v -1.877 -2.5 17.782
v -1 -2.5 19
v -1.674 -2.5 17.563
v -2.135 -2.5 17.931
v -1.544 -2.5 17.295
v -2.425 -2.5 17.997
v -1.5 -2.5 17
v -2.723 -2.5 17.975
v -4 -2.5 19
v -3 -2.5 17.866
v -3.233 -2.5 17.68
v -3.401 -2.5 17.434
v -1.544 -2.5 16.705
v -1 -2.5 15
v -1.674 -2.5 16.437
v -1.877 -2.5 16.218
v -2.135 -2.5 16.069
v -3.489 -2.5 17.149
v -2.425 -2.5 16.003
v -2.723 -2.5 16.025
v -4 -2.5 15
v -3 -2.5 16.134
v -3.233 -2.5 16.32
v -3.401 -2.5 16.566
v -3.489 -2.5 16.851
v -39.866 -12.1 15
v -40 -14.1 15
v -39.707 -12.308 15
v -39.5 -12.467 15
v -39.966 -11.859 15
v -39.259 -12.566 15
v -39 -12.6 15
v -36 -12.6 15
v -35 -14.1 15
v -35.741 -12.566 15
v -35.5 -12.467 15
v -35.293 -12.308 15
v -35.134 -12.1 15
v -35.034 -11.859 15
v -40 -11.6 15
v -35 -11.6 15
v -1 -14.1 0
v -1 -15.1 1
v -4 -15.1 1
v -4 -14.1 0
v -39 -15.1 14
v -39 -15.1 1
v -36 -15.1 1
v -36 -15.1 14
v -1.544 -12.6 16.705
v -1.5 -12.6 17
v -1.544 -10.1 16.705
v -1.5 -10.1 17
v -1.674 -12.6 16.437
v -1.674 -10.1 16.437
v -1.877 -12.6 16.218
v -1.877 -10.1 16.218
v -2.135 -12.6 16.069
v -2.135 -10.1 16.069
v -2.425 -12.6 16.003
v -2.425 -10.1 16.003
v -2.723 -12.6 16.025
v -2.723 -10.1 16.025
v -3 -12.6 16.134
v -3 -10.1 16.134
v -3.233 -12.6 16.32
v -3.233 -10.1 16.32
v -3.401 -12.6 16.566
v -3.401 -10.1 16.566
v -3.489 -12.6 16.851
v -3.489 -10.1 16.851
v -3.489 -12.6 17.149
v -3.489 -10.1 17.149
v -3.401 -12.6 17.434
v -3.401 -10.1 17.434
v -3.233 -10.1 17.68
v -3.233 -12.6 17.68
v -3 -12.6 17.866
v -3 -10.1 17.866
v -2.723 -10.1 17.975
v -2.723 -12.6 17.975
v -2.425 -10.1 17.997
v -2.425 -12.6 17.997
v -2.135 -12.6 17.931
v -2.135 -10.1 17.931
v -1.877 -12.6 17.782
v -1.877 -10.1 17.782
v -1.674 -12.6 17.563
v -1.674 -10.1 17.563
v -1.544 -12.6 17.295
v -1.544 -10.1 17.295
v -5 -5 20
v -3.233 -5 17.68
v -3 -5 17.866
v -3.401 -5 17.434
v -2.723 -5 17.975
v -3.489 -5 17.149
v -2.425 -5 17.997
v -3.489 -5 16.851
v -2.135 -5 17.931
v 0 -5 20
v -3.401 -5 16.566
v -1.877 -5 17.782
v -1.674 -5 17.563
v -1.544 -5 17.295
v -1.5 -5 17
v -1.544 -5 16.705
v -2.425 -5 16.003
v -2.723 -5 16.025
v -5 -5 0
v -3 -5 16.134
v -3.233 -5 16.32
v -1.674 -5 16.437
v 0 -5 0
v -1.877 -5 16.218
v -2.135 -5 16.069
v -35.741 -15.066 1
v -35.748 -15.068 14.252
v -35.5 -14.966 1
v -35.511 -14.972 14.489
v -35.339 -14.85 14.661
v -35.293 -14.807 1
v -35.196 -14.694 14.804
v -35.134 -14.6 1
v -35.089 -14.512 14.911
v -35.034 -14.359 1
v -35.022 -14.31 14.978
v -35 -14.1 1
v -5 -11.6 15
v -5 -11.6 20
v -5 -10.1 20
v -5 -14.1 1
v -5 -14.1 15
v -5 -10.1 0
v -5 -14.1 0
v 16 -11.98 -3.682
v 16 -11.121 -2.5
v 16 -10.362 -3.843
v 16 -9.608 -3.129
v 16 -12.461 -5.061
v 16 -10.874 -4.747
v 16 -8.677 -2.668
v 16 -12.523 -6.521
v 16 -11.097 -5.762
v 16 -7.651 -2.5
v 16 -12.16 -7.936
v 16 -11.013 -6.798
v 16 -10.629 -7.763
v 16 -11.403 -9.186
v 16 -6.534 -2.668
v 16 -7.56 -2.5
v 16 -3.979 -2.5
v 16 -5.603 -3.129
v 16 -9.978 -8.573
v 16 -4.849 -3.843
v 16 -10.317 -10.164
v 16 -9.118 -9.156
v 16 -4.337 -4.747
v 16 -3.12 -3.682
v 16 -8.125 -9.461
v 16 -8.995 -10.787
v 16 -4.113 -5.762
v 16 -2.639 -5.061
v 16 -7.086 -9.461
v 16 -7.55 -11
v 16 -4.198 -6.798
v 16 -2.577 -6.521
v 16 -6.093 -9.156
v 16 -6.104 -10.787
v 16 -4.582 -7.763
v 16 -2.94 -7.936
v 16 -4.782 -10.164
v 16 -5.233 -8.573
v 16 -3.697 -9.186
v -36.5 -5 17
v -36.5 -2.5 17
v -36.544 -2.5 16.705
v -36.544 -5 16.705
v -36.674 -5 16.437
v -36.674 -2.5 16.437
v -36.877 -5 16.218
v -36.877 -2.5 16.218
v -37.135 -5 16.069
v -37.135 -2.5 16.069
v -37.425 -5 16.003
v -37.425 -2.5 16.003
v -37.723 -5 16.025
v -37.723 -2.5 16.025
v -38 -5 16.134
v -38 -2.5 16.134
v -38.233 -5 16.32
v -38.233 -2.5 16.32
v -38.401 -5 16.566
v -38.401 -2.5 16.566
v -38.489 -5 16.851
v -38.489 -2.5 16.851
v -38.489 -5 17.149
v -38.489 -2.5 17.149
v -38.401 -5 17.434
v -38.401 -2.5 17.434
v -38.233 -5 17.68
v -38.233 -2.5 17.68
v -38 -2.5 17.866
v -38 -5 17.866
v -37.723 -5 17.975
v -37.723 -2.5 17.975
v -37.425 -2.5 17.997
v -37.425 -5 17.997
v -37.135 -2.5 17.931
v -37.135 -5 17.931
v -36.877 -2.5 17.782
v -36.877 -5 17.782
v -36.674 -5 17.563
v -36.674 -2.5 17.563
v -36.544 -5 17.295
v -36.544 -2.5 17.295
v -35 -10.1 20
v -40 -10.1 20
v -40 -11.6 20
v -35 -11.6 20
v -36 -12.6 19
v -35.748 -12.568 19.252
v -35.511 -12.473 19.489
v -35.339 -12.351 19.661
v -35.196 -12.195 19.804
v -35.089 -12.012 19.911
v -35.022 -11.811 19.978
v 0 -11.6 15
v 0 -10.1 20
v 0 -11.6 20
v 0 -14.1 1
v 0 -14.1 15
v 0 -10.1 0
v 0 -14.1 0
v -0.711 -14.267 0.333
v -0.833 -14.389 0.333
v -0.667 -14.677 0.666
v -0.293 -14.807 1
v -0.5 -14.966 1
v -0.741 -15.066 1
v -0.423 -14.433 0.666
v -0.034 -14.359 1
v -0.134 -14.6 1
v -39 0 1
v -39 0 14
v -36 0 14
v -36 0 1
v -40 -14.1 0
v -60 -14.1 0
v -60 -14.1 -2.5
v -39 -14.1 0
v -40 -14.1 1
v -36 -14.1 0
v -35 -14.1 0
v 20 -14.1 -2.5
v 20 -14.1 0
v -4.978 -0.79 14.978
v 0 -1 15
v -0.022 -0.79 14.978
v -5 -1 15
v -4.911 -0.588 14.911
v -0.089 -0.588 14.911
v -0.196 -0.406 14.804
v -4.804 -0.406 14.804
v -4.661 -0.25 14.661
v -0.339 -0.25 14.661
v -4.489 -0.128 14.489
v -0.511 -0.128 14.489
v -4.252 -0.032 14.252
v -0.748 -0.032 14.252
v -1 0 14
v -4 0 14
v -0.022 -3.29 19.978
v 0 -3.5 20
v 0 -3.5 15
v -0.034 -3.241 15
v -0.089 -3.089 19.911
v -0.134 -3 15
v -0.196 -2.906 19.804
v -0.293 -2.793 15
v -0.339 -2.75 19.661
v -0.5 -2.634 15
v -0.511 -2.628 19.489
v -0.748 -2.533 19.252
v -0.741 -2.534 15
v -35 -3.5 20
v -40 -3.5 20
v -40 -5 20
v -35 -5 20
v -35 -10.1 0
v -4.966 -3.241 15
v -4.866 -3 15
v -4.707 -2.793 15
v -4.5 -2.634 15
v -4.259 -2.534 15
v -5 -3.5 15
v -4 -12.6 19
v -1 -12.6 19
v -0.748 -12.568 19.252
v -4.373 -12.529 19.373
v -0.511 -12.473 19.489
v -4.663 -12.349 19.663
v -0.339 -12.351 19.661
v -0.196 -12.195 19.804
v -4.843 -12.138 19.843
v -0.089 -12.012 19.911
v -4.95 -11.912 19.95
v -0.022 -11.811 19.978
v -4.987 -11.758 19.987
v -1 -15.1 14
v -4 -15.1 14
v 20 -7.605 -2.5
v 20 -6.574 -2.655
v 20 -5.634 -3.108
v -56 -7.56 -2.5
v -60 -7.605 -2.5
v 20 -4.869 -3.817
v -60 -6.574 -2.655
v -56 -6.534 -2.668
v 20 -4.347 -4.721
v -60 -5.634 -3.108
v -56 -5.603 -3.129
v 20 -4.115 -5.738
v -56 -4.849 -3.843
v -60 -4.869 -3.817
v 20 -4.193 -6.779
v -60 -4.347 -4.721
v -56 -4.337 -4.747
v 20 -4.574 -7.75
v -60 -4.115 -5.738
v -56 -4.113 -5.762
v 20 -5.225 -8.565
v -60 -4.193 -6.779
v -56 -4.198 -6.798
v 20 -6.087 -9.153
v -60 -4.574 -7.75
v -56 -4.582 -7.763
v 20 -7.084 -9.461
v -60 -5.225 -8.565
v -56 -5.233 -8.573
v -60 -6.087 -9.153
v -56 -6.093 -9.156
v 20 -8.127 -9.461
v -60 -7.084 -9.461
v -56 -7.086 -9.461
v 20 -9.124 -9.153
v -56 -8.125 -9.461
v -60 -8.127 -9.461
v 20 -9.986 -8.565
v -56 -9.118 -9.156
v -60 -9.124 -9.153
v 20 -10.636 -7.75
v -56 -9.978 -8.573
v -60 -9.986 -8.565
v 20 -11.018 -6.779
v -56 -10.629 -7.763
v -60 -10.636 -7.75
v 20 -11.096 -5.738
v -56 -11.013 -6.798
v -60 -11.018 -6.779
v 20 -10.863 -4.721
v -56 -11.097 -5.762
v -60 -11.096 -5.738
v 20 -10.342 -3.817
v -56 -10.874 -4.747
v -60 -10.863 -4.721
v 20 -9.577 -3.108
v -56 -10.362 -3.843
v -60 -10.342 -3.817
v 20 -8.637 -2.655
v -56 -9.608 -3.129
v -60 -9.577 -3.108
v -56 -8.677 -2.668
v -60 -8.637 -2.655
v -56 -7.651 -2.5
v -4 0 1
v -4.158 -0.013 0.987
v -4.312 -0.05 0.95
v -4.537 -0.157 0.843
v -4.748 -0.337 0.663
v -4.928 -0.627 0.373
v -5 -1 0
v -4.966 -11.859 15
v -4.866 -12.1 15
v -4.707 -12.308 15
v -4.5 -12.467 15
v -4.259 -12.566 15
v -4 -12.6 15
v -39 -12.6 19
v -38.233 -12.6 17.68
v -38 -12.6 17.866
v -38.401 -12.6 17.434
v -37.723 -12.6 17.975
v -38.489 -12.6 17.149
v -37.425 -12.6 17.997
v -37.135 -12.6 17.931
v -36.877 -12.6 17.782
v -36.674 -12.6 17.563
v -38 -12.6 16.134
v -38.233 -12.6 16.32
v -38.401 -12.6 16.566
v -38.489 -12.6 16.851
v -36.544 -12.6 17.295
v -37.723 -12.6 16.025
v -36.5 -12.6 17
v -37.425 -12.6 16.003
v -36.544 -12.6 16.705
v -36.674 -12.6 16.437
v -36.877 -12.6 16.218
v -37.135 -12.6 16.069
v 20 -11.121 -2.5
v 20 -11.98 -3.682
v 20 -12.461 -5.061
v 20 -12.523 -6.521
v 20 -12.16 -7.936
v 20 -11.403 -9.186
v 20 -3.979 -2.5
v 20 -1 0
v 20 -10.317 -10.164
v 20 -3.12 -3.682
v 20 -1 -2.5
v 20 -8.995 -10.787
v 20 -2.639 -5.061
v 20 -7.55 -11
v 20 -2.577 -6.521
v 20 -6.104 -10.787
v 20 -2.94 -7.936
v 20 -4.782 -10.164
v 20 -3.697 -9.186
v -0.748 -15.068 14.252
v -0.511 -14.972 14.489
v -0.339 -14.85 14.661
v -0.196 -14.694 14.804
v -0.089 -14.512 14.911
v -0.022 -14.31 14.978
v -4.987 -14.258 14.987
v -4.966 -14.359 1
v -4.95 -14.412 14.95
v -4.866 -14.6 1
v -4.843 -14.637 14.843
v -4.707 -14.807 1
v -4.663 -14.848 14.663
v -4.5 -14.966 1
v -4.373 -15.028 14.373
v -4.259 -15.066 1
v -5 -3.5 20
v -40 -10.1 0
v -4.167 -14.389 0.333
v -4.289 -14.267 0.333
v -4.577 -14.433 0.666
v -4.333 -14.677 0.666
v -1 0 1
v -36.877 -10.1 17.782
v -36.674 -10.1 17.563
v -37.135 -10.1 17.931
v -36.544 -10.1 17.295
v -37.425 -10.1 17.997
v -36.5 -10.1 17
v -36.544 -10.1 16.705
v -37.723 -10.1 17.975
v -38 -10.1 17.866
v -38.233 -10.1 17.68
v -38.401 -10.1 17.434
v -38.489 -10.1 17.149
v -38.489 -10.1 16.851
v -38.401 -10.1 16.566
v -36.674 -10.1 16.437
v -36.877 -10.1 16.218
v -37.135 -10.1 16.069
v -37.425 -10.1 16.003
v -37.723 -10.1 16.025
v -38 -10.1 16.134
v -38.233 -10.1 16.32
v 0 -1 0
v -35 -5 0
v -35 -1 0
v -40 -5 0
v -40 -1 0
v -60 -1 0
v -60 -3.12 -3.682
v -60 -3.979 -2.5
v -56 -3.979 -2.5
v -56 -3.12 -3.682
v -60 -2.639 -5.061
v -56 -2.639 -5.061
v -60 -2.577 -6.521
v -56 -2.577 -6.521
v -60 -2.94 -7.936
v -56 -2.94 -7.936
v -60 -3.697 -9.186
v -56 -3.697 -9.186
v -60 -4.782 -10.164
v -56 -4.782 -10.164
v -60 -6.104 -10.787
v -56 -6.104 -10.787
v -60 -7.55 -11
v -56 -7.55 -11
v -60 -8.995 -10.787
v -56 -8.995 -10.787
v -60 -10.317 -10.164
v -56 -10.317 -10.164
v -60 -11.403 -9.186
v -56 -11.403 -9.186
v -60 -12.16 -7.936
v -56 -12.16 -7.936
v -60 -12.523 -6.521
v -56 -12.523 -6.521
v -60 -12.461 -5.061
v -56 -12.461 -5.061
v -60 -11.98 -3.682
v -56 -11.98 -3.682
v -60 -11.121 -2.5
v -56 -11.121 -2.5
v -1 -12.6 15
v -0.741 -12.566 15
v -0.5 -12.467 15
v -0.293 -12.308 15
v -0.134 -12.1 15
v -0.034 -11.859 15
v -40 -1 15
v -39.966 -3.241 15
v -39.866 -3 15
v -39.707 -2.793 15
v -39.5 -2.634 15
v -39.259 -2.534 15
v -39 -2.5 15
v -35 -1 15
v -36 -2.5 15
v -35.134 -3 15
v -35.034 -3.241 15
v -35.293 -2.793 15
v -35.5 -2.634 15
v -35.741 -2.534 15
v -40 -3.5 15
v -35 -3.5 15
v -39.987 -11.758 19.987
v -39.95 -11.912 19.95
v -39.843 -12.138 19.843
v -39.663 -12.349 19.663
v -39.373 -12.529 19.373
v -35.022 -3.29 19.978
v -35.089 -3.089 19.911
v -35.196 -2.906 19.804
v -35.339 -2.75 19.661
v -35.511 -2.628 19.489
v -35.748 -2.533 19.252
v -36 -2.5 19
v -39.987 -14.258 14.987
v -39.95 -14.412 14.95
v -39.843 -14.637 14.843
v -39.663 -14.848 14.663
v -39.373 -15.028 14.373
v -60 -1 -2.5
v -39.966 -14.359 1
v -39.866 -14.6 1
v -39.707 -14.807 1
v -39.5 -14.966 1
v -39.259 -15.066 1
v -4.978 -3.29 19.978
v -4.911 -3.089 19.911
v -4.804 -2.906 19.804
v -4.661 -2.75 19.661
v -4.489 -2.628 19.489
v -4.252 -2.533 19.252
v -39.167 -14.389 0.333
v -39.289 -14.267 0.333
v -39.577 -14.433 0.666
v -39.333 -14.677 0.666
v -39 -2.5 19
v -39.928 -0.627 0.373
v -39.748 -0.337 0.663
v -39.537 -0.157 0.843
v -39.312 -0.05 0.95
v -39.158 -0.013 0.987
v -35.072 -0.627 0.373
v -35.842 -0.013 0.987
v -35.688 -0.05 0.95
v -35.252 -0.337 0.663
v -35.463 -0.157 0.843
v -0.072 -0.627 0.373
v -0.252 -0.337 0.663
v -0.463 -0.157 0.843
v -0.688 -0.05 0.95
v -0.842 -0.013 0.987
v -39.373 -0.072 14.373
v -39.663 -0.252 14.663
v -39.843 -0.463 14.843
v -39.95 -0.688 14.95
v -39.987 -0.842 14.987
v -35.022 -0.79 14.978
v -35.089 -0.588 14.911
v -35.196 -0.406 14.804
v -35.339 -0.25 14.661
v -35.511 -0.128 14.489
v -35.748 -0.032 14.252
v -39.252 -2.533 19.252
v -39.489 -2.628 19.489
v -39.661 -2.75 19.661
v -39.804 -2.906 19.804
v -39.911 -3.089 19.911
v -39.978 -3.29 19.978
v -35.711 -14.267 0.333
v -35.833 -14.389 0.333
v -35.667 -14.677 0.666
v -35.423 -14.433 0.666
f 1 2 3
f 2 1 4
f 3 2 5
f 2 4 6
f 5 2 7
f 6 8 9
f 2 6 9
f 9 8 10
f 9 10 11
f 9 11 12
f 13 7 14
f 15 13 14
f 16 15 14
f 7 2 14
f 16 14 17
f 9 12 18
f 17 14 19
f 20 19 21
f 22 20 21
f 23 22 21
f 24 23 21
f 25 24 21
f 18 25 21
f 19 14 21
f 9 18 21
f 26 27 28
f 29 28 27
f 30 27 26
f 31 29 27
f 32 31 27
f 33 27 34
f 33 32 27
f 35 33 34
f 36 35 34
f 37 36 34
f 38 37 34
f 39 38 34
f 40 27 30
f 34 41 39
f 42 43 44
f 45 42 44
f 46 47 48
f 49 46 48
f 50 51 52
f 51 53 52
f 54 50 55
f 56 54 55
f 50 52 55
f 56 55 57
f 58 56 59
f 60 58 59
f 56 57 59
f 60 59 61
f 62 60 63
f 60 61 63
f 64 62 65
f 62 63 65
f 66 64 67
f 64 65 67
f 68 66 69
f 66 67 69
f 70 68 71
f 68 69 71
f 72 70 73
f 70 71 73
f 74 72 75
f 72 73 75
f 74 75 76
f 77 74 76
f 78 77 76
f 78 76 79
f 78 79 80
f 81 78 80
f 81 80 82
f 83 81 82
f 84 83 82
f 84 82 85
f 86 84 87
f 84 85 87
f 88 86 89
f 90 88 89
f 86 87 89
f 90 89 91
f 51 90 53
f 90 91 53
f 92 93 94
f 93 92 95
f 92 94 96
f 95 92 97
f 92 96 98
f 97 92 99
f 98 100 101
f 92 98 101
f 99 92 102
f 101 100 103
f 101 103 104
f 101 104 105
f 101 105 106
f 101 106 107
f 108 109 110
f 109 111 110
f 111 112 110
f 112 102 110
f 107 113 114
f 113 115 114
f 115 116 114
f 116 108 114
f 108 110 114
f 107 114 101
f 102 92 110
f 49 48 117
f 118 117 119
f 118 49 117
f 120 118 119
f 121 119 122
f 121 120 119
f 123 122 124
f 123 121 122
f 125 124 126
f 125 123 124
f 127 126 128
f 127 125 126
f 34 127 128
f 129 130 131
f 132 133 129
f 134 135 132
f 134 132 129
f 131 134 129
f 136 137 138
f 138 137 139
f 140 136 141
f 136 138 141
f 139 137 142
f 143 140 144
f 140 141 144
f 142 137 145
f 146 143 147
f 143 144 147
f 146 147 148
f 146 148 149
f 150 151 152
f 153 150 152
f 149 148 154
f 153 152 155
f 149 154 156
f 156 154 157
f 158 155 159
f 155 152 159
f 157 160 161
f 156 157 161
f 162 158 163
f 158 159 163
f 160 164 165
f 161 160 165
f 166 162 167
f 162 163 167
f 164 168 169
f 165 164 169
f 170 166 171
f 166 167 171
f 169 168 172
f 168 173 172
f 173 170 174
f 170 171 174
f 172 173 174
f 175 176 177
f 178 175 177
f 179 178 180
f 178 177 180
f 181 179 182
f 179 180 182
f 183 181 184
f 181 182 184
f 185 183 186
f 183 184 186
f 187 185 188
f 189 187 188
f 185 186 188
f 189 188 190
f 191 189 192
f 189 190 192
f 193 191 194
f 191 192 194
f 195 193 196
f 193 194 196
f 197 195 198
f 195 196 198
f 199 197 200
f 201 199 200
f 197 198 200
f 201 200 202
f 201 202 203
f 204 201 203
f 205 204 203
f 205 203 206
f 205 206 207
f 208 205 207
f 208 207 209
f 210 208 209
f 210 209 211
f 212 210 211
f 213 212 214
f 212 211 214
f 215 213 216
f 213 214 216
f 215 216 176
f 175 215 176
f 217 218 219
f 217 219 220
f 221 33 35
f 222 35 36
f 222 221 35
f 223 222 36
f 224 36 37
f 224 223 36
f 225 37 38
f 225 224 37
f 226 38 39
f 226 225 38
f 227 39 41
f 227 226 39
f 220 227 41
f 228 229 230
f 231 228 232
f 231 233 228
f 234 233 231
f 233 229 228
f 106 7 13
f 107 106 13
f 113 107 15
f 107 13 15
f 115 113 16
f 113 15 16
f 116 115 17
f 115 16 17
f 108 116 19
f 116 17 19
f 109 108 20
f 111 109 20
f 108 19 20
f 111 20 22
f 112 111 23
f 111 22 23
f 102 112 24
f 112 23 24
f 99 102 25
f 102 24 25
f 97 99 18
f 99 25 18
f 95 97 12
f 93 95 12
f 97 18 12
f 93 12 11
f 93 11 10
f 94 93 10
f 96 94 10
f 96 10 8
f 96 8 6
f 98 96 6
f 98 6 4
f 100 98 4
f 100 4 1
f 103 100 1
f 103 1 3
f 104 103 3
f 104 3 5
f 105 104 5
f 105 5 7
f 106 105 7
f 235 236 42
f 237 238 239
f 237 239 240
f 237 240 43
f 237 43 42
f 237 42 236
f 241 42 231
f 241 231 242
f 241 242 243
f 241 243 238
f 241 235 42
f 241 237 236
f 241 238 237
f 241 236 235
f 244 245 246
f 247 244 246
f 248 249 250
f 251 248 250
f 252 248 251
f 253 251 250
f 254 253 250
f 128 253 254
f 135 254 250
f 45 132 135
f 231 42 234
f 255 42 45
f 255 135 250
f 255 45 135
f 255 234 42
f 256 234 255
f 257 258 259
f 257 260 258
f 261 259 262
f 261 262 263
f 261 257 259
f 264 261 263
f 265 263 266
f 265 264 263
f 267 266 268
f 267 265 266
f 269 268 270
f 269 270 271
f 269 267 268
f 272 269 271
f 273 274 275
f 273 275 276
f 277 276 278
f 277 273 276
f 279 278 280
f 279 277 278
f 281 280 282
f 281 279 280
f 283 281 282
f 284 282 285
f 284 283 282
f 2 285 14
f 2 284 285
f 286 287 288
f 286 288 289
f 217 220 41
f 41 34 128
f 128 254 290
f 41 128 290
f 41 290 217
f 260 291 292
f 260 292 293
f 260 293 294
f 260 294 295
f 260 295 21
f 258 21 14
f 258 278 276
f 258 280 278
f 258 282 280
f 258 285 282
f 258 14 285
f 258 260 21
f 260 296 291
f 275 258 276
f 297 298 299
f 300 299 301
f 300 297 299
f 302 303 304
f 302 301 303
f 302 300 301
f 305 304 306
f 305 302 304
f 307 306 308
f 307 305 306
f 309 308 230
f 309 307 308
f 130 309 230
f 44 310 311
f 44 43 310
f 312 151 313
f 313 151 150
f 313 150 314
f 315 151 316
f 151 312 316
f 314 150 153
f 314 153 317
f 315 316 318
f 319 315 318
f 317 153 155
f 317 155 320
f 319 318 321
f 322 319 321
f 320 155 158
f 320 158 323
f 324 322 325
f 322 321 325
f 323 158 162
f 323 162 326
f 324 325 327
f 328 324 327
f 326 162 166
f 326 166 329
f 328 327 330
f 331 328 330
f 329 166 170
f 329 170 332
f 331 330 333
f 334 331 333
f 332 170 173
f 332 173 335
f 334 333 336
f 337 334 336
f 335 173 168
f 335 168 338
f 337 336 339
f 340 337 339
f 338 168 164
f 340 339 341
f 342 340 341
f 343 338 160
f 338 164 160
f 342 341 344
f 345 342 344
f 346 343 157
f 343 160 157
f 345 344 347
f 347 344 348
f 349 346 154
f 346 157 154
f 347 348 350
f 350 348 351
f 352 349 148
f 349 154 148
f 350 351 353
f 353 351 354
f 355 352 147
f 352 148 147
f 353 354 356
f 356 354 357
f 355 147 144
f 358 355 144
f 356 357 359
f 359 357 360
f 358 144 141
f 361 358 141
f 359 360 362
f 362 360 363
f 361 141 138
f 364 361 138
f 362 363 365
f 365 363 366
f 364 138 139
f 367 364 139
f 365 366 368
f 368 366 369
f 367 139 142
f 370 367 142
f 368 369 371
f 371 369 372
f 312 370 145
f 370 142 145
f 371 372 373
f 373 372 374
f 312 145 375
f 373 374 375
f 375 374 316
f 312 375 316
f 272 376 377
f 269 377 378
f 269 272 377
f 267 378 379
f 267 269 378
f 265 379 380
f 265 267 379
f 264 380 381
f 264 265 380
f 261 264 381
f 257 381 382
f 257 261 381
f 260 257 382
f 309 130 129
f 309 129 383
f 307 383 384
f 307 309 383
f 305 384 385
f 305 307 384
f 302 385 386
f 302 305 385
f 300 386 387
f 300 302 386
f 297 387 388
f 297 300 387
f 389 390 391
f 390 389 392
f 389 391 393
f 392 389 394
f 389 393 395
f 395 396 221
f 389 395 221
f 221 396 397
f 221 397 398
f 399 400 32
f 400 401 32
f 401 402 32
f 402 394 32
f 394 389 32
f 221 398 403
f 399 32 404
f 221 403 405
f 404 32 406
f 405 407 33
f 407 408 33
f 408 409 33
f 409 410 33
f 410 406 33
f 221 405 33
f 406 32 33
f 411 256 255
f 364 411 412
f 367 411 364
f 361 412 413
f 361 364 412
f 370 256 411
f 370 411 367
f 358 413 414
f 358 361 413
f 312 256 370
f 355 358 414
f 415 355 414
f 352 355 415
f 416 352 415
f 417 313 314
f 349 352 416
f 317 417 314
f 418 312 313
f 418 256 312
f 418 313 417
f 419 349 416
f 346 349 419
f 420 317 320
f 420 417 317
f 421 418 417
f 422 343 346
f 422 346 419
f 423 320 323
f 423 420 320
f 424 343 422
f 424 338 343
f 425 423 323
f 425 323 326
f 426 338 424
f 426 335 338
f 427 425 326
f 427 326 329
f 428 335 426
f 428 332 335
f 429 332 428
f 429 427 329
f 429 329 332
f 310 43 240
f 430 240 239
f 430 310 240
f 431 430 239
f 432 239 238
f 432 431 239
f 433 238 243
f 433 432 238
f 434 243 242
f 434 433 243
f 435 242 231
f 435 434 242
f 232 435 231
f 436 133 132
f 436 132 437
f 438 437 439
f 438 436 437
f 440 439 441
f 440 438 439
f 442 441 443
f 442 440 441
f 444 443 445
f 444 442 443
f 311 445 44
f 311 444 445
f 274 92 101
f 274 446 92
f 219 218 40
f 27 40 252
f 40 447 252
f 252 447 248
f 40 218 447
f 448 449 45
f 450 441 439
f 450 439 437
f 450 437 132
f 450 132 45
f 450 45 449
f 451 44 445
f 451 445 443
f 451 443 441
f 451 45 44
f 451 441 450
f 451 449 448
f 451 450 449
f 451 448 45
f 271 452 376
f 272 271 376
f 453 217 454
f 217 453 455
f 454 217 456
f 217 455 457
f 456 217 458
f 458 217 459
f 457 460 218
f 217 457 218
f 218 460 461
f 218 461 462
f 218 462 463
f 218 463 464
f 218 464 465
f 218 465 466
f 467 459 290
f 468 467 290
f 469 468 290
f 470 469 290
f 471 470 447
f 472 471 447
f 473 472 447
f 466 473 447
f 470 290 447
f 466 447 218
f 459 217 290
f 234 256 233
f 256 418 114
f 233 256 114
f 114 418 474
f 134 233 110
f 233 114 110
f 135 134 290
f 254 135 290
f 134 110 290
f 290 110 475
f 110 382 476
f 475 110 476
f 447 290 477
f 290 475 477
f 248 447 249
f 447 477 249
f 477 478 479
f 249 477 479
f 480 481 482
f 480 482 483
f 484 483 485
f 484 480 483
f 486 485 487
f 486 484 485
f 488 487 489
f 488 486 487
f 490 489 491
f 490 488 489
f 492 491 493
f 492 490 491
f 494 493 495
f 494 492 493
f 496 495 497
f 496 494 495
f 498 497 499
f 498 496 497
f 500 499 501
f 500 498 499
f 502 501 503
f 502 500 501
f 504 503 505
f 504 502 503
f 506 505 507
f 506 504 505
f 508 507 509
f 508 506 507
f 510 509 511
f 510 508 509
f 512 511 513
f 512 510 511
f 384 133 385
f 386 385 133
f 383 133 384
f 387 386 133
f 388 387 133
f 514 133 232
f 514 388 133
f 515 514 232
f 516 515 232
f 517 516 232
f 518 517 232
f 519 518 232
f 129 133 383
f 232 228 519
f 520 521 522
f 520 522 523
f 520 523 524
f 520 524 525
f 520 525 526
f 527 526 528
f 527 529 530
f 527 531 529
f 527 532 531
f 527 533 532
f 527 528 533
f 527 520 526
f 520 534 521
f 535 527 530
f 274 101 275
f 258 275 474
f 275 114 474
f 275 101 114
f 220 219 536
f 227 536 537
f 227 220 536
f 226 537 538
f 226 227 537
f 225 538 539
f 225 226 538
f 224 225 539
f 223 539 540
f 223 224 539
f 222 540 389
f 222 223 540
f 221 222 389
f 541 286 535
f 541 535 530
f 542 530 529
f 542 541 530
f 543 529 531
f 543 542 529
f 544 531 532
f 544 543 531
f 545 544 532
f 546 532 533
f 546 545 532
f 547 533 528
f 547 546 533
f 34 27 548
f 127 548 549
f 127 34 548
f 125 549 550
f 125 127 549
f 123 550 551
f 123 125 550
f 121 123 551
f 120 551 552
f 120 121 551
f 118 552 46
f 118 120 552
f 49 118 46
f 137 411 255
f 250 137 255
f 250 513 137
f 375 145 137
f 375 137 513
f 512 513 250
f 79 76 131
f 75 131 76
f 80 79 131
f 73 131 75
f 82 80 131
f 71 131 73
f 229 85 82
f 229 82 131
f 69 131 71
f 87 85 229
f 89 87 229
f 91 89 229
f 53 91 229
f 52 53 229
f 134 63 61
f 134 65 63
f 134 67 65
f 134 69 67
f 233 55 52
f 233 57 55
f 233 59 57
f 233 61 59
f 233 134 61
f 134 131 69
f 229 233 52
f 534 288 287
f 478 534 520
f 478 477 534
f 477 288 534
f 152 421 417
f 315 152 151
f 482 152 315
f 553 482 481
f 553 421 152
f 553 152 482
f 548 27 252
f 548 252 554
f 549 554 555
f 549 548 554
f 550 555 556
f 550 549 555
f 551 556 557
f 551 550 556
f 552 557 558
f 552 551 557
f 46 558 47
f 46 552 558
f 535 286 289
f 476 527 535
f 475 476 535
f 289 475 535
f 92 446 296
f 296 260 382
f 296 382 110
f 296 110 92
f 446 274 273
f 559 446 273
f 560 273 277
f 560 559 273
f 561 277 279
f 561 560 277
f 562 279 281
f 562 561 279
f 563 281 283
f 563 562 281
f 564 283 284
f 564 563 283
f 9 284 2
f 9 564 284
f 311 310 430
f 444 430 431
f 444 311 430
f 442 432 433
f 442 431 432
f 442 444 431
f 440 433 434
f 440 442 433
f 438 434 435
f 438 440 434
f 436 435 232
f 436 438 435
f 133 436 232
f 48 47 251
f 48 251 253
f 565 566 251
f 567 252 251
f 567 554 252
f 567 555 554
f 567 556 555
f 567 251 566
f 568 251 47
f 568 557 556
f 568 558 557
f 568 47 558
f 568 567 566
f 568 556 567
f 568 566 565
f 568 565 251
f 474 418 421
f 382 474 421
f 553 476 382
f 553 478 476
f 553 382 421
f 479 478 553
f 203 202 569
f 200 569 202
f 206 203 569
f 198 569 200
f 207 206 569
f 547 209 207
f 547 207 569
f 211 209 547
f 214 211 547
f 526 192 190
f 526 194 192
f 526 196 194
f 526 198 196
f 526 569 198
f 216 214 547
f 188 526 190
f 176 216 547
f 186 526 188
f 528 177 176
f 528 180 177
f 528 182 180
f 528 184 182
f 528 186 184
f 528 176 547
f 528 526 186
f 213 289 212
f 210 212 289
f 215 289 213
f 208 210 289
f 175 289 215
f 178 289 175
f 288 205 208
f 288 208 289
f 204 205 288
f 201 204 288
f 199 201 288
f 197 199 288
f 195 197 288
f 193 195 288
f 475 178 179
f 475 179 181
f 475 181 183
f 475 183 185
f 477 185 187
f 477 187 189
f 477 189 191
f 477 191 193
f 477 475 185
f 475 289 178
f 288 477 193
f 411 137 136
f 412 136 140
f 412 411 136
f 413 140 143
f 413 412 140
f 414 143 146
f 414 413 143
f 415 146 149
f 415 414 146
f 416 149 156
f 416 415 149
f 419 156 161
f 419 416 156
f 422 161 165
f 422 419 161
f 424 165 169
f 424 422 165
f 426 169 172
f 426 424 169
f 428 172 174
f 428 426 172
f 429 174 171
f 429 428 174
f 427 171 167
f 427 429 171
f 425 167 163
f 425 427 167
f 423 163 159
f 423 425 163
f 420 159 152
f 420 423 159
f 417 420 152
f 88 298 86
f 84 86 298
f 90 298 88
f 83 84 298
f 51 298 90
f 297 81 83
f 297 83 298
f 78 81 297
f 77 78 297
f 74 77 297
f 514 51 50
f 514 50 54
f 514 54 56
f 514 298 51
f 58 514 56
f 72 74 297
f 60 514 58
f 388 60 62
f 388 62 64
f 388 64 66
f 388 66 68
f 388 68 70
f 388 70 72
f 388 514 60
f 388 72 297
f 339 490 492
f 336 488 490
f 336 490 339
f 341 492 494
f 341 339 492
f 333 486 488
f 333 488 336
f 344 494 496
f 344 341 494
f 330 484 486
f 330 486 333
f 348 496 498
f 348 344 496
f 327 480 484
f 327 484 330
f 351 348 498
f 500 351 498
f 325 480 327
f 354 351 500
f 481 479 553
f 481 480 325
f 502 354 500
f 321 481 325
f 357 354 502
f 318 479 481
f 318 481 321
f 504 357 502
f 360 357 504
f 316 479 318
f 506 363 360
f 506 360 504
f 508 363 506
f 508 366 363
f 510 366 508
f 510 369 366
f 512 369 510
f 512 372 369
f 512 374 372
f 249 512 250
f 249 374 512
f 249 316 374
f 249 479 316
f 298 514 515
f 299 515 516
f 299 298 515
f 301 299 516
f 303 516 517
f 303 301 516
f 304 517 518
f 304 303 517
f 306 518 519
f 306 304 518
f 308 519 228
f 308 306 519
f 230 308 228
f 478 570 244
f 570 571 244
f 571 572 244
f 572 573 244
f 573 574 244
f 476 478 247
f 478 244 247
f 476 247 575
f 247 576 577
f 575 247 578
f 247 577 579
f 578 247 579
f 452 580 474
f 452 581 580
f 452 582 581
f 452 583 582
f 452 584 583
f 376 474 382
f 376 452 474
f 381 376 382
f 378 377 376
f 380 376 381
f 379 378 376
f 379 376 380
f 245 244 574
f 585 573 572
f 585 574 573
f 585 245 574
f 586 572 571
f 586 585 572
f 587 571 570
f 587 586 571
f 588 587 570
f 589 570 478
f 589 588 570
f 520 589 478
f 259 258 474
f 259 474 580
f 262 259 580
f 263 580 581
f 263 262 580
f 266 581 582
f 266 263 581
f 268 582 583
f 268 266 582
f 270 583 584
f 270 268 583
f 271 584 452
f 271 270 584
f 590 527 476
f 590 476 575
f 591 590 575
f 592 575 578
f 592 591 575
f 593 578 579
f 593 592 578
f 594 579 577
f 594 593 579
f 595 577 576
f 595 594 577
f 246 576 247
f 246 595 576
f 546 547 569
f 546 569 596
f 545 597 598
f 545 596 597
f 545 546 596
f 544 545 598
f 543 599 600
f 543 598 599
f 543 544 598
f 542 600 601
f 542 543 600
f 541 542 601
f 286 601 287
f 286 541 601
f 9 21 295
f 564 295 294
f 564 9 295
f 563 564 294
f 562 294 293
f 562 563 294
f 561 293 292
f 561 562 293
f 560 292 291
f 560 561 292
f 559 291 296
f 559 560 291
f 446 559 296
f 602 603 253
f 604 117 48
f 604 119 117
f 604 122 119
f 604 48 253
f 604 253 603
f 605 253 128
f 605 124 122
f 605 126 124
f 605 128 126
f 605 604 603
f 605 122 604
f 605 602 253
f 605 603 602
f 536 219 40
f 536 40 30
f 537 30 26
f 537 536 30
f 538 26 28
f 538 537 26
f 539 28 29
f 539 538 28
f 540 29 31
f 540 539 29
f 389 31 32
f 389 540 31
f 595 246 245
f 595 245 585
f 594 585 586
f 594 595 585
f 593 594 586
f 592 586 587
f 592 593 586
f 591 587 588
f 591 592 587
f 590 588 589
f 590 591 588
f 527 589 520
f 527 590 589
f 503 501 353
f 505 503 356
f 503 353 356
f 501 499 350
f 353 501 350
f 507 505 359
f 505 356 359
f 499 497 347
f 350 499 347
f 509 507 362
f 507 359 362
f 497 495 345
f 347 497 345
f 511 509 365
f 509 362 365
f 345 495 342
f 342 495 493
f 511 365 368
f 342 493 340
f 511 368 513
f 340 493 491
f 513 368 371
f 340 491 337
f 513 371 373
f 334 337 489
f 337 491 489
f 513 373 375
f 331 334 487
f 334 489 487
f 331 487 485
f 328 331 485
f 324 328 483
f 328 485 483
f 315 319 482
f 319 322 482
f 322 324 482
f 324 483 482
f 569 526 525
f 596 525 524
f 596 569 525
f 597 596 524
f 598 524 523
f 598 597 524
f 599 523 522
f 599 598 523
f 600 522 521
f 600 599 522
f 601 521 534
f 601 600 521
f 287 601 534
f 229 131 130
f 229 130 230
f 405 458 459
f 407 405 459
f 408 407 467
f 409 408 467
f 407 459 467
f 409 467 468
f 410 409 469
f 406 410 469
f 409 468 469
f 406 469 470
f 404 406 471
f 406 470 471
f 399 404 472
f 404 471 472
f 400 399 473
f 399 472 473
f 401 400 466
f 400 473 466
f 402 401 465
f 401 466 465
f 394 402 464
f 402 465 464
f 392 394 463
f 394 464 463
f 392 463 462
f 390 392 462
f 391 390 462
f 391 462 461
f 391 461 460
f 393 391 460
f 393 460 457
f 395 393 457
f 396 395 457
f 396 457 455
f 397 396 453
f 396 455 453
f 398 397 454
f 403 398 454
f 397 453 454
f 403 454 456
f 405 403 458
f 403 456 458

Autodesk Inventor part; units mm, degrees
ref_plane "YZ Plane" through (0, 0, 0) normal (1, 0, 0) x (0, 1, 0)
ref_plane "XZ Plane" through (0, 0, 0) normal (0, 1, 0) x (-1, 0, 0)
ref_plane "XY Plane" through (0, 0, 0) normal (0, 0, 1) x (1, 0, 0)
sketch "Sketch1" plane through (0, 0, 0) normal (0, 0, 1) x (1, 0, 0)
  line L0 (0, 0) -> (-5, 0)
  line L1 (-5, 0) -> (-5, -5)
  line L2 (-5, -5) -> (0, -5)
  line L3 (0, -5) -> (0, 0)
  line L4 (-40, 0) -> (-35, 0)
  line L5 (-35, 0) -> (-35, -5)
  line L6 (-35, -5) -> (-40, -5)
  line L7 (-40, -5) -> (-40, 0)
  line L8 (0, -15.1) -> (-5, -15.1)
  line L9 (-5, -15.1) -> (-5, -10.1)
  line L10 (-5, -10.1) -> (0, -10.1)
  line L11 (0, -10.1) -> (0, -15.1)
  line L12 (-40, -15.1) -> (-35, -15.1)
  line L13 (-35, -15.1) -> (-35, -10.1)
  line L14 (-35, -10.1) -> (-40, -10.1)
  line L15 (-40, -10.1) -> (-40, -15.1)
  line L16 (0, 0) -> (-5, 0)
  line L17 (-35, 0) -> (-40, 0)
  line L18 (0, -15.1) -> (0, -10.1)
  line L19 (0, -5) -> (0, 0)
  line L20 (-40, -15.1) -> (-35, -15.1)
  line L21 (-5, -15.1) -> (0, -15.1)
  line L22 (-40, 0) -> (-40, -5)
  line L23 (-40, -10.1) -> (-40, -15.1)
  dimension "d0" = 40
  dimension "d1" = 15.1
  dimension "d2" = 5
  dimension "d3" = 5
  dimension "d4" = 5
  dimension "d5" = 5
  dimension "d6" = 5
  dimension "d7" = 5
  dimension "d8" = 5
  dimension "d9" = 5
extrude "Mounting arms" add sketch "Sketch1" along normal blind 15
sketch "Sketch2" plane through (0, 0, 0) normal (0, 0, -1) x (-1, 0, 0)
  line L0 (-19.9999, -1.0001) -> (59.9998, -1.0001)
  line L1 (59.9998, -1.0001) -> (59.9998, -14.0997)
  line L2 (59.9998, -14.0997) -> (-19.9999, -14.0997)
  line L3 (-19.9999, -14.0997) -> (-19.9999, -1.0001)
  point P0 (0, 0)
extrude "Plate" add sketch "Sketch2" along normal blind 2.5
sketch "Sketch3" plane through (19.9999, -14.0997, 0) normal (1, 0, 0) x (0, 0, -1)
  circle A0 centre (6, 6.5498) radius 5
  point P0 (0, 14.0997)
  dimension "d14" = 10
sketch "Sketch5" plane through (-59.9998, -14.0997, 0) normal (-1, 0, 0) x (0, 0, 1)
  circle A0 centre (-6, 6.5498) radius 5
  point P0 (0, 14.0997)
  dimension "d15" = 10
extrude "retainer1" add sketch "Sketch5" against normal blind 4
extrude "retainer2" add sketch "Sketch3" against normal blind 4
sketch "Sketch6" plane through (-59.9998, -14.0997, 0) normal (-1, 0, 0) x (0, 0, 1)
  line L0 (0, 13.0996) -> (0, 0) projected
  circle A0 centre (-5.9997, 6.4943) radius 3.5
  point P0 (0, 14.0997)
  dimension "d21" = 7
extrude "cyldiner shaft holes" cut sketch "Sketch6" against normal blind 80
chamfer "Chamfer1" distance 1 angle 45 2 edges at (-37.5, 0, 0) (-2.5, 0, 0)
sketch "Sketch7" plane through (0, 0, 15) normal (0, 0, 1) x (1, 0, 0)
  line L0 (-40, -1.0001) -> (-40, -5) projected
  line L1 (0, -14.0997) -> (0, -10.1) projected
  line L2 (-35, -14.0997) -> (-35, -10.1) projected
  line L3 (-40, -12.6005) -> (-35, -12.6005)
  line L4 (-35, -12.6005) -> (-35, -10.1)
  line L5 (-35, -10.1) -> (-40, -10.1)
  line L6 (-40, -10.1) -> (-40, -12.6005)
  line L7 (-5, -10.1) -> (-5, -15.1) projected
  line L8 (0, -12.6005) -> (-5, -12.6005)
  line L9 (-5, -12.6005) -> (-5, -10.1)
  line L10 (-5, -10.1) -> (0, -10.1)
  line L11 (0, -10.1) -> (0, -12.6005)
  line L12 (-5, -5) -> (0, -5) projected
  line L13 (0, -2.5001) -> (-5, -2.5001)
  line L14 (-5, -2.5001) -> (-5, -5)
  line L15 (-5, -5) -> (0, -5)
  line L16 (0, -5) -> (0, -2.5001)
  line L17 (-40, -2.5001) -> (-35, -2.5001)
  line L18 (-35, -2.5001) -> (-35, -5)
  line L19 (-35, -5) -> (-40, -5)
  line L20 (-40, -5) -> (-40, -2.5001)
  line L21 (-40, -2.5001) -> (-35, -2.5001)
  line L22 (-5, -2.5001) -> (0, -2.5001)
  line L23 (-40, -12.6005) -> (-40, -10.1)
  line L24 (-40, -5) -> (-40, -2.5001)
  line L25 (0, -12.6005) -> (-5, -12.6005)
  line L26 (-35, -12.6005) -> (-40, -12.6005)
  line L27 (0, -2.5001) -> (0, -5)
  line L28 (0, -10.1) -> (0, -12.6005)
  point P0 (0, 0)
extrude "Extrusion6" add sketch "Sketch7" along normal blind 5
fillet "Fillet1" radius 1 24 edges at (-35, -2.5001, 17.5) (-40, -2.5001, 17.5) (-37.5, -2.5001, 20) (-5, -2.5001, 17.5) (0, -2.5001, 17.5) (-2.5, -2.5001, 20) (0, -12.6005, 17.5) (-2.5, -12.6005, 20) (-5, -12.6005, 17.5) (-35, -12.6005, 17.5) (-37.5, -12.6005, 20) (-40, -12.6005, 17.5) (0, 0, 8) (-5, 0, 8) (-2.5, 0, 15) (-35, 0, 8) (-37.5, 0, 15) (-40, 0, 8) (0, -15.1, 7.5) (-2.5, -15.1, 15) (-5, -15.1, 7.5) (-35, -15.1, 7.5) (-37.5, -15.1, 15) (-40, -15.1, 7.5)
chamfer "Chamfer2" distance 1 angle 45 10 edges at (-37.5, -15.1, 0) (-35.2929, -14.8071, 0) (-35, -14.0999, 0) (-39.7071, -14.8071, 0) (-40, -14.0999, 0) (-2.5, -15.1, 0) (-0.2929, -14.8071, 0) (0, -14.0999, 0) (-4.7071, -14.8071, 0) (-5, -14.0999, 0)
sketch "Sketch8" plane through (-4, -2.5001, 15) normal (0, 1, 0) x (1, 0, 0)
  circle A0 centre (1.5, -2) radius 1
  circle A1 centre (-33.5, -2) radius 1
  point P0 (4, 15)
  dimension "d33" = 2
  dimension "d34" = 2
extrude "Extrusion7" cut sketch "Sketch8" against normal blind 10.2
properties part number "sccop_mount"
